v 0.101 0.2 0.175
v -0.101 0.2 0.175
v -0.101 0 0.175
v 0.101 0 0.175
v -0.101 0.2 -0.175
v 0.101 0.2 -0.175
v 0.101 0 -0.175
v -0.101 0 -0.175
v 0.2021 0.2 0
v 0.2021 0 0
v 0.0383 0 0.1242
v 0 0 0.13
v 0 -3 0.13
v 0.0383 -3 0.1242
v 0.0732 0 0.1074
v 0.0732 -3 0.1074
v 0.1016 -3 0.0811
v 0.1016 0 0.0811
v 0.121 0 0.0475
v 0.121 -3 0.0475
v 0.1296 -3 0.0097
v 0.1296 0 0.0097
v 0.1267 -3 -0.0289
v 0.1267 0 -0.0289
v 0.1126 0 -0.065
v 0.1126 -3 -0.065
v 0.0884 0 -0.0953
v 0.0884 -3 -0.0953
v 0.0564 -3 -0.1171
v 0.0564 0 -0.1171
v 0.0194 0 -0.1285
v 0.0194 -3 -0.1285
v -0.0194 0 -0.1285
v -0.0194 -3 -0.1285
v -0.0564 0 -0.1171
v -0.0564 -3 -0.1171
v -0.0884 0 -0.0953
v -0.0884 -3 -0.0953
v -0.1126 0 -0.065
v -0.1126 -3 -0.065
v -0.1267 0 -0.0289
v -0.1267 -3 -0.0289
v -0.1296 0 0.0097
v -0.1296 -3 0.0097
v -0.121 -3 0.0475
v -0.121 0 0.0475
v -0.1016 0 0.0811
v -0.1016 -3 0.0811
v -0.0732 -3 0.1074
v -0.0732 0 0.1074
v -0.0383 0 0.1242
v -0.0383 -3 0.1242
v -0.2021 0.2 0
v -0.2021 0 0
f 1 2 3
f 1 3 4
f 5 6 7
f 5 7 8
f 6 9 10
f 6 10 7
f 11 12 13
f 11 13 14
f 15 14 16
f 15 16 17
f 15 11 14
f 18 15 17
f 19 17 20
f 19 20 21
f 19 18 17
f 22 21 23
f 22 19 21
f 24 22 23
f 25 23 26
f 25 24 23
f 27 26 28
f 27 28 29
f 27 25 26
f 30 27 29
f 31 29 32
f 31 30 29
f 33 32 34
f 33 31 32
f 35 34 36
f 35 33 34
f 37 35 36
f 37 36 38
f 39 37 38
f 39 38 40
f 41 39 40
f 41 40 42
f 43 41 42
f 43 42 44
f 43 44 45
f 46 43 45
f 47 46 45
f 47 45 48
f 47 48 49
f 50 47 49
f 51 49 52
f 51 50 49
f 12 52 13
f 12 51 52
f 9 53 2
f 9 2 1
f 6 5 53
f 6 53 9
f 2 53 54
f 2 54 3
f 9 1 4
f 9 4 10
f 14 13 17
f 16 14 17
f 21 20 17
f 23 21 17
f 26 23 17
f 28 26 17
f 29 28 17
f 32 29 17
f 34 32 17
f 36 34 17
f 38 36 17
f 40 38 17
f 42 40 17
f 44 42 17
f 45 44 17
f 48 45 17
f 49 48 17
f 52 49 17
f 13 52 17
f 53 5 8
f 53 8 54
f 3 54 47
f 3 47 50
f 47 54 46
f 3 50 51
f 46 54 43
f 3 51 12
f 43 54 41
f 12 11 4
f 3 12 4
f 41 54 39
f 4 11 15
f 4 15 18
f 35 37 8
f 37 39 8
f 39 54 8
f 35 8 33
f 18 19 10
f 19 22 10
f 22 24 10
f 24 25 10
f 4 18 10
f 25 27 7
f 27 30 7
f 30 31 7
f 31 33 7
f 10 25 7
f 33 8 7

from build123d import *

# Parameters (mm, degrees)
SKETCH1_R           = 0.13
BOSS_EXTRUDE1_DEPTH = 3
BOSS_EXTRUDE2_DEPTH = 0.2


with BuildPart() as part:
    # Sketch1 → Boss-Extrude1 (new body)
    with BuildSketch(Plane(origin=(0, 0, 0), x_dir=(1, 0, 0), z_dir=(0, 1, 0))):
        Circle(SKETCH1_R)
    extrude(amount=-BOSS_EXTRUDE1_DEPTH)

    # Sketch1<3> → Boss-Extrude2 (add)
    with BuildSketch(Plane(origin=(0, 0, 0), x_dir=(1, 0, 0), z_dir=(0, 1, 0))):
        Polygon((-0.101036297, -0.175), (0.101036297, -0.175), (0.202072594, 0), (0.101036297, 0.175), (-0.101036297, 0.175), (-0.202072594, 0), align=None)
    extrude(amount=BOSS_EXTRUDE2_DEPTH)


solid = part.part
